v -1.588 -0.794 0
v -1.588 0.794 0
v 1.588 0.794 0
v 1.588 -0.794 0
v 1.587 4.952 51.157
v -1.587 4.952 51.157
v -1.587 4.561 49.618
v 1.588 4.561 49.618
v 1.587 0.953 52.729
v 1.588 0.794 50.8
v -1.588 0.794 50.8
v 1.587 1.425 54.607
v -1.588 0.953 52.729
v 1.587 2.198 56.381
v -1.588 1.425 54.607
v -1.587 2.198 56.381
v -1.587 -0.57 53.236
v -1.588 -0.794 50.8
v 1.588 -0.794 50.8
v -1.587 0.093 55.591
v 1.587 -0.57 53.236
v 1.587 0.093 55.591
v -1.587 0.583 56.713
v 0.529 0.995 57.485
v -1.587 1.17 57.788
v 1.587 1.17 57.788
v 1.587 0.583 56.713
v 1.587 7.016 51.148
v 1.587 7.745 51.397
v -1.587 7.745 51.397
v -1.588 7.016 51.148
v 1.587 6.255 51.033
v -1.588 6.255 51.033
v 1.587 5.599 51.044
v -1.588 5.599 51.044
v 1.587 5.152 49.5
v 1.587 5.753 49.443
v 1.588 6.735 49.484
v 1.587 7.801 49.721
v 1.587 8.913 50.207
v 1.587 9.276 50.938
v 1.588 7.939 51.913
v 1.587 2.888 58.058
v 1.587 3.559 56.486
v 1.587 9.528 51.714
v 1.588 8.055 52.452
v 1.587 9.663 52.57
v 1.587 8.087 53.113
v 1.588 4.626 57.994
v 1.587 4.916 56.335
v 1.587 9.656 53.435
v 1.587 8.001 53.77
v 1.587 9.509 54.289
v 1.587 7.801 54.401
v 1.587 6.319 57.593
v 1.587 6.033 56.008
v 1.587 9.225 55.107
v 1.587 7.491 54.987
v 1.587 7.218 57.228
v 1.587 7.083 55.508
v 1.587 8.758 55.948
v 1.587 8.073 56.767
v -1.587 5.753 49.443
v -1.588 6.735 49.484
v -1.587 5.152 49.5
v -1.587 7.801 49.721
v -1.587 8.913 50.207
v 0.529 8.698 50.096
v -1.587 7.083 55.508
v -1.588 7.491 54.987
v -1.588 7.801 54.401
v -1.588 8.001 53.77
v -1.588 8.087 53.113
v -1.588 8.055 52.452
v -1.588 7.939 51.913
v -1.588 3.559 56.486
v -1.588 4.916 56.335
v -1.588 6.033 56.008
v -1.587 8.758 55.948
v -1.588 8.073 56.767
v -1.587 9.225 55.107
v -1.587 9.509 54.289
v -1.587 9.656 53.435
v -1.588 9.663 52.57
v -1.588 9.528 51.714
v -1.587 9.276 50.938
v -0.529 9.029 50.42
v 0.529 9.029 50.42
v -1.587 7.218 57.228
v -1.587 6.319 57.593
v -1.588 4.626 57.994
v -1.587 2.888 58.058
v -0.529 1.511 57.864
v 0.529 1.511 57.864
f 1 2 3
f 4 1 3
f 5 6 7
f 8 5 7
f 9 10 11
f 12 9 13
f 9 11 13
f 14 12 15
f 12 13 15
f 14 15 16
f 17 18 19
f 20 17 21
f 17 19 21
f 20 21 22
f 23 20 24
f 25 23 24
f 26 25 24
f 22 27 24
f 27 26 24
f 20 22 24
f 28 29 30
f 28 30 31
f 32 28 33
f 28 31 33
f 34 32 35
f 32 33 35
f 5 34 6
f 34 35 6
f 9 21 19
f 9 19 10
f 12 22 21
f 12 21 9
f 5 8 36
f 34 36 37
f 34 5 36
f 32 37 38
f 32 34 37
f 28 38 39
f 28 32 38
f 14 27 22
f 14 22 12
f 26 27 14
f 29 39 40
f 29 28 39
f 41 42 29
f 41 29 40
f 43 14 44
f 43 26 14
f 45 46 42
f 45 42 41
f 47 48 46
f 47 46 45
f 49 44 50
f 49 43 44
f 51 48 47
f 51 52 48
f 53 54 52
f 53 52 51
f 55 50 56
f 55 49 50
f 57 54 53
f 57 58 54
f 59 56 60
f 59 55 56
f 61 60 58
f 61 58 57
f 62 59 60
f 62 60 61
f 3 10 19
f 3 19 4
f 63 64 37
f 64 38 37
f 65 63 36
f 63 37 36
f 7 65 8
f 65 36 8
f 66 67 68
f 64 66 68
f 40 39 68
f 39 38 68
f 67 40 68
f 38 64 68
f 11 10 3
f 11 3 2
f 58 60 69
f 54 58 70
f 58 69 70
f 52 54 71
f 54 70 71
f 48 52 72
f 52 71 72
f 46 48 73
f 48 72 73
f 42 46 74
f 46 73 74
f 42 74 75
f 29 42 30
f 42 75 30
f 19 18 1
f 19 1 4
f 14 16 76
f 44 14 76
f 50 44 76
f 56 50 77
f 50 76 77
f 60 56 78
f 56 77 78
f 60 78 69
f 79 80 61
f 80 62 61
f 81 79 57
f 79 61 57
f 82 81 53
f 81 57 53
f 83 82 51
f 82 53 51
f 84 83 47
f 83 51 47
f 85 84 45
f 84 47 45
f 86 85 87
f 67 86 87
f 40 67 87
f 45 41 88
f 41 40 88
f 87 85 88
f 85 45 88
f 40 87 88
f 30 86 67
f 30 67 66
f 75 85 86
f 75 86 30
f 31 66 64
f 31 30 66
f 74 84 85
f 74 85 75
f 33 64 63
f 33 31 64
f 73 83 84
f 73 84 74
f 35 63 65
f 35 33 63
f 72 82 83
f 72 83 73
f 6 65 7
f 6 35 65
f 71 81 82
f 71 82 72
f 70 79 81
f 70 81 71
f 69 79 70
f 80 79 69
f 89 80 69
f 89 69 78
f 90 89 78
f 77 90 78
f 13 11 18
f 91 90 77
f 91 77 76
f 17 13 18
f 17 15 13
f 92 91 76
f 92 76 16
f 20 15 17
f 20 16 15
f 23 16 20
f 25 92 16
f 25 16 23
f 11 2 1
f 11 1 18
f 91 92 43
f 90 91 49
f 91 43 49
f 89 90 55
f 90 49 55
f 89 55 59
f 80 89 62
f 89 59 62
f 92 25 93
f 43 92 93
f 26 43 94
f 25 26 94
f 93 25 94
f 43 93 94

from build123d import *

# Parameters (mm, degrees)
F0_W = 3.175
F0_H = 1.5875


with BuildPart() as f2:
    # F2: sweep along a path in F1
    with BuildLine(Plane.YZ) as f2_path:
        Line((0, 0), (0, 50.8))
        ThreePointArc((0, 50.8), (0.4280140937, 54.0549830382), (1.6829564702, 57.0886656642))
        ThreePointArc((1.6829564702, 57.0886656642), (4.7221119441, 57.1776447605), (7.5789801776, 56.1371222138))
        ThreePointArc((7.5789801776, 56.1371222138), (8.8392841167, 53.5932413011), (8.331840375, 50.8))
        ThreePointArc((8.331840375, 50.8), (6.5820659855, 50.2648305913), (4.7563990811, 50.3875378201))
    # F0 (on Top) → F2 (sweep)
    with BuildSketch(Plane.XY):
        Rectangle(F0_W, F0_H)
    sweep(path=f2_path.line, transition=Transition.RIGHT)


solid = f2.part
